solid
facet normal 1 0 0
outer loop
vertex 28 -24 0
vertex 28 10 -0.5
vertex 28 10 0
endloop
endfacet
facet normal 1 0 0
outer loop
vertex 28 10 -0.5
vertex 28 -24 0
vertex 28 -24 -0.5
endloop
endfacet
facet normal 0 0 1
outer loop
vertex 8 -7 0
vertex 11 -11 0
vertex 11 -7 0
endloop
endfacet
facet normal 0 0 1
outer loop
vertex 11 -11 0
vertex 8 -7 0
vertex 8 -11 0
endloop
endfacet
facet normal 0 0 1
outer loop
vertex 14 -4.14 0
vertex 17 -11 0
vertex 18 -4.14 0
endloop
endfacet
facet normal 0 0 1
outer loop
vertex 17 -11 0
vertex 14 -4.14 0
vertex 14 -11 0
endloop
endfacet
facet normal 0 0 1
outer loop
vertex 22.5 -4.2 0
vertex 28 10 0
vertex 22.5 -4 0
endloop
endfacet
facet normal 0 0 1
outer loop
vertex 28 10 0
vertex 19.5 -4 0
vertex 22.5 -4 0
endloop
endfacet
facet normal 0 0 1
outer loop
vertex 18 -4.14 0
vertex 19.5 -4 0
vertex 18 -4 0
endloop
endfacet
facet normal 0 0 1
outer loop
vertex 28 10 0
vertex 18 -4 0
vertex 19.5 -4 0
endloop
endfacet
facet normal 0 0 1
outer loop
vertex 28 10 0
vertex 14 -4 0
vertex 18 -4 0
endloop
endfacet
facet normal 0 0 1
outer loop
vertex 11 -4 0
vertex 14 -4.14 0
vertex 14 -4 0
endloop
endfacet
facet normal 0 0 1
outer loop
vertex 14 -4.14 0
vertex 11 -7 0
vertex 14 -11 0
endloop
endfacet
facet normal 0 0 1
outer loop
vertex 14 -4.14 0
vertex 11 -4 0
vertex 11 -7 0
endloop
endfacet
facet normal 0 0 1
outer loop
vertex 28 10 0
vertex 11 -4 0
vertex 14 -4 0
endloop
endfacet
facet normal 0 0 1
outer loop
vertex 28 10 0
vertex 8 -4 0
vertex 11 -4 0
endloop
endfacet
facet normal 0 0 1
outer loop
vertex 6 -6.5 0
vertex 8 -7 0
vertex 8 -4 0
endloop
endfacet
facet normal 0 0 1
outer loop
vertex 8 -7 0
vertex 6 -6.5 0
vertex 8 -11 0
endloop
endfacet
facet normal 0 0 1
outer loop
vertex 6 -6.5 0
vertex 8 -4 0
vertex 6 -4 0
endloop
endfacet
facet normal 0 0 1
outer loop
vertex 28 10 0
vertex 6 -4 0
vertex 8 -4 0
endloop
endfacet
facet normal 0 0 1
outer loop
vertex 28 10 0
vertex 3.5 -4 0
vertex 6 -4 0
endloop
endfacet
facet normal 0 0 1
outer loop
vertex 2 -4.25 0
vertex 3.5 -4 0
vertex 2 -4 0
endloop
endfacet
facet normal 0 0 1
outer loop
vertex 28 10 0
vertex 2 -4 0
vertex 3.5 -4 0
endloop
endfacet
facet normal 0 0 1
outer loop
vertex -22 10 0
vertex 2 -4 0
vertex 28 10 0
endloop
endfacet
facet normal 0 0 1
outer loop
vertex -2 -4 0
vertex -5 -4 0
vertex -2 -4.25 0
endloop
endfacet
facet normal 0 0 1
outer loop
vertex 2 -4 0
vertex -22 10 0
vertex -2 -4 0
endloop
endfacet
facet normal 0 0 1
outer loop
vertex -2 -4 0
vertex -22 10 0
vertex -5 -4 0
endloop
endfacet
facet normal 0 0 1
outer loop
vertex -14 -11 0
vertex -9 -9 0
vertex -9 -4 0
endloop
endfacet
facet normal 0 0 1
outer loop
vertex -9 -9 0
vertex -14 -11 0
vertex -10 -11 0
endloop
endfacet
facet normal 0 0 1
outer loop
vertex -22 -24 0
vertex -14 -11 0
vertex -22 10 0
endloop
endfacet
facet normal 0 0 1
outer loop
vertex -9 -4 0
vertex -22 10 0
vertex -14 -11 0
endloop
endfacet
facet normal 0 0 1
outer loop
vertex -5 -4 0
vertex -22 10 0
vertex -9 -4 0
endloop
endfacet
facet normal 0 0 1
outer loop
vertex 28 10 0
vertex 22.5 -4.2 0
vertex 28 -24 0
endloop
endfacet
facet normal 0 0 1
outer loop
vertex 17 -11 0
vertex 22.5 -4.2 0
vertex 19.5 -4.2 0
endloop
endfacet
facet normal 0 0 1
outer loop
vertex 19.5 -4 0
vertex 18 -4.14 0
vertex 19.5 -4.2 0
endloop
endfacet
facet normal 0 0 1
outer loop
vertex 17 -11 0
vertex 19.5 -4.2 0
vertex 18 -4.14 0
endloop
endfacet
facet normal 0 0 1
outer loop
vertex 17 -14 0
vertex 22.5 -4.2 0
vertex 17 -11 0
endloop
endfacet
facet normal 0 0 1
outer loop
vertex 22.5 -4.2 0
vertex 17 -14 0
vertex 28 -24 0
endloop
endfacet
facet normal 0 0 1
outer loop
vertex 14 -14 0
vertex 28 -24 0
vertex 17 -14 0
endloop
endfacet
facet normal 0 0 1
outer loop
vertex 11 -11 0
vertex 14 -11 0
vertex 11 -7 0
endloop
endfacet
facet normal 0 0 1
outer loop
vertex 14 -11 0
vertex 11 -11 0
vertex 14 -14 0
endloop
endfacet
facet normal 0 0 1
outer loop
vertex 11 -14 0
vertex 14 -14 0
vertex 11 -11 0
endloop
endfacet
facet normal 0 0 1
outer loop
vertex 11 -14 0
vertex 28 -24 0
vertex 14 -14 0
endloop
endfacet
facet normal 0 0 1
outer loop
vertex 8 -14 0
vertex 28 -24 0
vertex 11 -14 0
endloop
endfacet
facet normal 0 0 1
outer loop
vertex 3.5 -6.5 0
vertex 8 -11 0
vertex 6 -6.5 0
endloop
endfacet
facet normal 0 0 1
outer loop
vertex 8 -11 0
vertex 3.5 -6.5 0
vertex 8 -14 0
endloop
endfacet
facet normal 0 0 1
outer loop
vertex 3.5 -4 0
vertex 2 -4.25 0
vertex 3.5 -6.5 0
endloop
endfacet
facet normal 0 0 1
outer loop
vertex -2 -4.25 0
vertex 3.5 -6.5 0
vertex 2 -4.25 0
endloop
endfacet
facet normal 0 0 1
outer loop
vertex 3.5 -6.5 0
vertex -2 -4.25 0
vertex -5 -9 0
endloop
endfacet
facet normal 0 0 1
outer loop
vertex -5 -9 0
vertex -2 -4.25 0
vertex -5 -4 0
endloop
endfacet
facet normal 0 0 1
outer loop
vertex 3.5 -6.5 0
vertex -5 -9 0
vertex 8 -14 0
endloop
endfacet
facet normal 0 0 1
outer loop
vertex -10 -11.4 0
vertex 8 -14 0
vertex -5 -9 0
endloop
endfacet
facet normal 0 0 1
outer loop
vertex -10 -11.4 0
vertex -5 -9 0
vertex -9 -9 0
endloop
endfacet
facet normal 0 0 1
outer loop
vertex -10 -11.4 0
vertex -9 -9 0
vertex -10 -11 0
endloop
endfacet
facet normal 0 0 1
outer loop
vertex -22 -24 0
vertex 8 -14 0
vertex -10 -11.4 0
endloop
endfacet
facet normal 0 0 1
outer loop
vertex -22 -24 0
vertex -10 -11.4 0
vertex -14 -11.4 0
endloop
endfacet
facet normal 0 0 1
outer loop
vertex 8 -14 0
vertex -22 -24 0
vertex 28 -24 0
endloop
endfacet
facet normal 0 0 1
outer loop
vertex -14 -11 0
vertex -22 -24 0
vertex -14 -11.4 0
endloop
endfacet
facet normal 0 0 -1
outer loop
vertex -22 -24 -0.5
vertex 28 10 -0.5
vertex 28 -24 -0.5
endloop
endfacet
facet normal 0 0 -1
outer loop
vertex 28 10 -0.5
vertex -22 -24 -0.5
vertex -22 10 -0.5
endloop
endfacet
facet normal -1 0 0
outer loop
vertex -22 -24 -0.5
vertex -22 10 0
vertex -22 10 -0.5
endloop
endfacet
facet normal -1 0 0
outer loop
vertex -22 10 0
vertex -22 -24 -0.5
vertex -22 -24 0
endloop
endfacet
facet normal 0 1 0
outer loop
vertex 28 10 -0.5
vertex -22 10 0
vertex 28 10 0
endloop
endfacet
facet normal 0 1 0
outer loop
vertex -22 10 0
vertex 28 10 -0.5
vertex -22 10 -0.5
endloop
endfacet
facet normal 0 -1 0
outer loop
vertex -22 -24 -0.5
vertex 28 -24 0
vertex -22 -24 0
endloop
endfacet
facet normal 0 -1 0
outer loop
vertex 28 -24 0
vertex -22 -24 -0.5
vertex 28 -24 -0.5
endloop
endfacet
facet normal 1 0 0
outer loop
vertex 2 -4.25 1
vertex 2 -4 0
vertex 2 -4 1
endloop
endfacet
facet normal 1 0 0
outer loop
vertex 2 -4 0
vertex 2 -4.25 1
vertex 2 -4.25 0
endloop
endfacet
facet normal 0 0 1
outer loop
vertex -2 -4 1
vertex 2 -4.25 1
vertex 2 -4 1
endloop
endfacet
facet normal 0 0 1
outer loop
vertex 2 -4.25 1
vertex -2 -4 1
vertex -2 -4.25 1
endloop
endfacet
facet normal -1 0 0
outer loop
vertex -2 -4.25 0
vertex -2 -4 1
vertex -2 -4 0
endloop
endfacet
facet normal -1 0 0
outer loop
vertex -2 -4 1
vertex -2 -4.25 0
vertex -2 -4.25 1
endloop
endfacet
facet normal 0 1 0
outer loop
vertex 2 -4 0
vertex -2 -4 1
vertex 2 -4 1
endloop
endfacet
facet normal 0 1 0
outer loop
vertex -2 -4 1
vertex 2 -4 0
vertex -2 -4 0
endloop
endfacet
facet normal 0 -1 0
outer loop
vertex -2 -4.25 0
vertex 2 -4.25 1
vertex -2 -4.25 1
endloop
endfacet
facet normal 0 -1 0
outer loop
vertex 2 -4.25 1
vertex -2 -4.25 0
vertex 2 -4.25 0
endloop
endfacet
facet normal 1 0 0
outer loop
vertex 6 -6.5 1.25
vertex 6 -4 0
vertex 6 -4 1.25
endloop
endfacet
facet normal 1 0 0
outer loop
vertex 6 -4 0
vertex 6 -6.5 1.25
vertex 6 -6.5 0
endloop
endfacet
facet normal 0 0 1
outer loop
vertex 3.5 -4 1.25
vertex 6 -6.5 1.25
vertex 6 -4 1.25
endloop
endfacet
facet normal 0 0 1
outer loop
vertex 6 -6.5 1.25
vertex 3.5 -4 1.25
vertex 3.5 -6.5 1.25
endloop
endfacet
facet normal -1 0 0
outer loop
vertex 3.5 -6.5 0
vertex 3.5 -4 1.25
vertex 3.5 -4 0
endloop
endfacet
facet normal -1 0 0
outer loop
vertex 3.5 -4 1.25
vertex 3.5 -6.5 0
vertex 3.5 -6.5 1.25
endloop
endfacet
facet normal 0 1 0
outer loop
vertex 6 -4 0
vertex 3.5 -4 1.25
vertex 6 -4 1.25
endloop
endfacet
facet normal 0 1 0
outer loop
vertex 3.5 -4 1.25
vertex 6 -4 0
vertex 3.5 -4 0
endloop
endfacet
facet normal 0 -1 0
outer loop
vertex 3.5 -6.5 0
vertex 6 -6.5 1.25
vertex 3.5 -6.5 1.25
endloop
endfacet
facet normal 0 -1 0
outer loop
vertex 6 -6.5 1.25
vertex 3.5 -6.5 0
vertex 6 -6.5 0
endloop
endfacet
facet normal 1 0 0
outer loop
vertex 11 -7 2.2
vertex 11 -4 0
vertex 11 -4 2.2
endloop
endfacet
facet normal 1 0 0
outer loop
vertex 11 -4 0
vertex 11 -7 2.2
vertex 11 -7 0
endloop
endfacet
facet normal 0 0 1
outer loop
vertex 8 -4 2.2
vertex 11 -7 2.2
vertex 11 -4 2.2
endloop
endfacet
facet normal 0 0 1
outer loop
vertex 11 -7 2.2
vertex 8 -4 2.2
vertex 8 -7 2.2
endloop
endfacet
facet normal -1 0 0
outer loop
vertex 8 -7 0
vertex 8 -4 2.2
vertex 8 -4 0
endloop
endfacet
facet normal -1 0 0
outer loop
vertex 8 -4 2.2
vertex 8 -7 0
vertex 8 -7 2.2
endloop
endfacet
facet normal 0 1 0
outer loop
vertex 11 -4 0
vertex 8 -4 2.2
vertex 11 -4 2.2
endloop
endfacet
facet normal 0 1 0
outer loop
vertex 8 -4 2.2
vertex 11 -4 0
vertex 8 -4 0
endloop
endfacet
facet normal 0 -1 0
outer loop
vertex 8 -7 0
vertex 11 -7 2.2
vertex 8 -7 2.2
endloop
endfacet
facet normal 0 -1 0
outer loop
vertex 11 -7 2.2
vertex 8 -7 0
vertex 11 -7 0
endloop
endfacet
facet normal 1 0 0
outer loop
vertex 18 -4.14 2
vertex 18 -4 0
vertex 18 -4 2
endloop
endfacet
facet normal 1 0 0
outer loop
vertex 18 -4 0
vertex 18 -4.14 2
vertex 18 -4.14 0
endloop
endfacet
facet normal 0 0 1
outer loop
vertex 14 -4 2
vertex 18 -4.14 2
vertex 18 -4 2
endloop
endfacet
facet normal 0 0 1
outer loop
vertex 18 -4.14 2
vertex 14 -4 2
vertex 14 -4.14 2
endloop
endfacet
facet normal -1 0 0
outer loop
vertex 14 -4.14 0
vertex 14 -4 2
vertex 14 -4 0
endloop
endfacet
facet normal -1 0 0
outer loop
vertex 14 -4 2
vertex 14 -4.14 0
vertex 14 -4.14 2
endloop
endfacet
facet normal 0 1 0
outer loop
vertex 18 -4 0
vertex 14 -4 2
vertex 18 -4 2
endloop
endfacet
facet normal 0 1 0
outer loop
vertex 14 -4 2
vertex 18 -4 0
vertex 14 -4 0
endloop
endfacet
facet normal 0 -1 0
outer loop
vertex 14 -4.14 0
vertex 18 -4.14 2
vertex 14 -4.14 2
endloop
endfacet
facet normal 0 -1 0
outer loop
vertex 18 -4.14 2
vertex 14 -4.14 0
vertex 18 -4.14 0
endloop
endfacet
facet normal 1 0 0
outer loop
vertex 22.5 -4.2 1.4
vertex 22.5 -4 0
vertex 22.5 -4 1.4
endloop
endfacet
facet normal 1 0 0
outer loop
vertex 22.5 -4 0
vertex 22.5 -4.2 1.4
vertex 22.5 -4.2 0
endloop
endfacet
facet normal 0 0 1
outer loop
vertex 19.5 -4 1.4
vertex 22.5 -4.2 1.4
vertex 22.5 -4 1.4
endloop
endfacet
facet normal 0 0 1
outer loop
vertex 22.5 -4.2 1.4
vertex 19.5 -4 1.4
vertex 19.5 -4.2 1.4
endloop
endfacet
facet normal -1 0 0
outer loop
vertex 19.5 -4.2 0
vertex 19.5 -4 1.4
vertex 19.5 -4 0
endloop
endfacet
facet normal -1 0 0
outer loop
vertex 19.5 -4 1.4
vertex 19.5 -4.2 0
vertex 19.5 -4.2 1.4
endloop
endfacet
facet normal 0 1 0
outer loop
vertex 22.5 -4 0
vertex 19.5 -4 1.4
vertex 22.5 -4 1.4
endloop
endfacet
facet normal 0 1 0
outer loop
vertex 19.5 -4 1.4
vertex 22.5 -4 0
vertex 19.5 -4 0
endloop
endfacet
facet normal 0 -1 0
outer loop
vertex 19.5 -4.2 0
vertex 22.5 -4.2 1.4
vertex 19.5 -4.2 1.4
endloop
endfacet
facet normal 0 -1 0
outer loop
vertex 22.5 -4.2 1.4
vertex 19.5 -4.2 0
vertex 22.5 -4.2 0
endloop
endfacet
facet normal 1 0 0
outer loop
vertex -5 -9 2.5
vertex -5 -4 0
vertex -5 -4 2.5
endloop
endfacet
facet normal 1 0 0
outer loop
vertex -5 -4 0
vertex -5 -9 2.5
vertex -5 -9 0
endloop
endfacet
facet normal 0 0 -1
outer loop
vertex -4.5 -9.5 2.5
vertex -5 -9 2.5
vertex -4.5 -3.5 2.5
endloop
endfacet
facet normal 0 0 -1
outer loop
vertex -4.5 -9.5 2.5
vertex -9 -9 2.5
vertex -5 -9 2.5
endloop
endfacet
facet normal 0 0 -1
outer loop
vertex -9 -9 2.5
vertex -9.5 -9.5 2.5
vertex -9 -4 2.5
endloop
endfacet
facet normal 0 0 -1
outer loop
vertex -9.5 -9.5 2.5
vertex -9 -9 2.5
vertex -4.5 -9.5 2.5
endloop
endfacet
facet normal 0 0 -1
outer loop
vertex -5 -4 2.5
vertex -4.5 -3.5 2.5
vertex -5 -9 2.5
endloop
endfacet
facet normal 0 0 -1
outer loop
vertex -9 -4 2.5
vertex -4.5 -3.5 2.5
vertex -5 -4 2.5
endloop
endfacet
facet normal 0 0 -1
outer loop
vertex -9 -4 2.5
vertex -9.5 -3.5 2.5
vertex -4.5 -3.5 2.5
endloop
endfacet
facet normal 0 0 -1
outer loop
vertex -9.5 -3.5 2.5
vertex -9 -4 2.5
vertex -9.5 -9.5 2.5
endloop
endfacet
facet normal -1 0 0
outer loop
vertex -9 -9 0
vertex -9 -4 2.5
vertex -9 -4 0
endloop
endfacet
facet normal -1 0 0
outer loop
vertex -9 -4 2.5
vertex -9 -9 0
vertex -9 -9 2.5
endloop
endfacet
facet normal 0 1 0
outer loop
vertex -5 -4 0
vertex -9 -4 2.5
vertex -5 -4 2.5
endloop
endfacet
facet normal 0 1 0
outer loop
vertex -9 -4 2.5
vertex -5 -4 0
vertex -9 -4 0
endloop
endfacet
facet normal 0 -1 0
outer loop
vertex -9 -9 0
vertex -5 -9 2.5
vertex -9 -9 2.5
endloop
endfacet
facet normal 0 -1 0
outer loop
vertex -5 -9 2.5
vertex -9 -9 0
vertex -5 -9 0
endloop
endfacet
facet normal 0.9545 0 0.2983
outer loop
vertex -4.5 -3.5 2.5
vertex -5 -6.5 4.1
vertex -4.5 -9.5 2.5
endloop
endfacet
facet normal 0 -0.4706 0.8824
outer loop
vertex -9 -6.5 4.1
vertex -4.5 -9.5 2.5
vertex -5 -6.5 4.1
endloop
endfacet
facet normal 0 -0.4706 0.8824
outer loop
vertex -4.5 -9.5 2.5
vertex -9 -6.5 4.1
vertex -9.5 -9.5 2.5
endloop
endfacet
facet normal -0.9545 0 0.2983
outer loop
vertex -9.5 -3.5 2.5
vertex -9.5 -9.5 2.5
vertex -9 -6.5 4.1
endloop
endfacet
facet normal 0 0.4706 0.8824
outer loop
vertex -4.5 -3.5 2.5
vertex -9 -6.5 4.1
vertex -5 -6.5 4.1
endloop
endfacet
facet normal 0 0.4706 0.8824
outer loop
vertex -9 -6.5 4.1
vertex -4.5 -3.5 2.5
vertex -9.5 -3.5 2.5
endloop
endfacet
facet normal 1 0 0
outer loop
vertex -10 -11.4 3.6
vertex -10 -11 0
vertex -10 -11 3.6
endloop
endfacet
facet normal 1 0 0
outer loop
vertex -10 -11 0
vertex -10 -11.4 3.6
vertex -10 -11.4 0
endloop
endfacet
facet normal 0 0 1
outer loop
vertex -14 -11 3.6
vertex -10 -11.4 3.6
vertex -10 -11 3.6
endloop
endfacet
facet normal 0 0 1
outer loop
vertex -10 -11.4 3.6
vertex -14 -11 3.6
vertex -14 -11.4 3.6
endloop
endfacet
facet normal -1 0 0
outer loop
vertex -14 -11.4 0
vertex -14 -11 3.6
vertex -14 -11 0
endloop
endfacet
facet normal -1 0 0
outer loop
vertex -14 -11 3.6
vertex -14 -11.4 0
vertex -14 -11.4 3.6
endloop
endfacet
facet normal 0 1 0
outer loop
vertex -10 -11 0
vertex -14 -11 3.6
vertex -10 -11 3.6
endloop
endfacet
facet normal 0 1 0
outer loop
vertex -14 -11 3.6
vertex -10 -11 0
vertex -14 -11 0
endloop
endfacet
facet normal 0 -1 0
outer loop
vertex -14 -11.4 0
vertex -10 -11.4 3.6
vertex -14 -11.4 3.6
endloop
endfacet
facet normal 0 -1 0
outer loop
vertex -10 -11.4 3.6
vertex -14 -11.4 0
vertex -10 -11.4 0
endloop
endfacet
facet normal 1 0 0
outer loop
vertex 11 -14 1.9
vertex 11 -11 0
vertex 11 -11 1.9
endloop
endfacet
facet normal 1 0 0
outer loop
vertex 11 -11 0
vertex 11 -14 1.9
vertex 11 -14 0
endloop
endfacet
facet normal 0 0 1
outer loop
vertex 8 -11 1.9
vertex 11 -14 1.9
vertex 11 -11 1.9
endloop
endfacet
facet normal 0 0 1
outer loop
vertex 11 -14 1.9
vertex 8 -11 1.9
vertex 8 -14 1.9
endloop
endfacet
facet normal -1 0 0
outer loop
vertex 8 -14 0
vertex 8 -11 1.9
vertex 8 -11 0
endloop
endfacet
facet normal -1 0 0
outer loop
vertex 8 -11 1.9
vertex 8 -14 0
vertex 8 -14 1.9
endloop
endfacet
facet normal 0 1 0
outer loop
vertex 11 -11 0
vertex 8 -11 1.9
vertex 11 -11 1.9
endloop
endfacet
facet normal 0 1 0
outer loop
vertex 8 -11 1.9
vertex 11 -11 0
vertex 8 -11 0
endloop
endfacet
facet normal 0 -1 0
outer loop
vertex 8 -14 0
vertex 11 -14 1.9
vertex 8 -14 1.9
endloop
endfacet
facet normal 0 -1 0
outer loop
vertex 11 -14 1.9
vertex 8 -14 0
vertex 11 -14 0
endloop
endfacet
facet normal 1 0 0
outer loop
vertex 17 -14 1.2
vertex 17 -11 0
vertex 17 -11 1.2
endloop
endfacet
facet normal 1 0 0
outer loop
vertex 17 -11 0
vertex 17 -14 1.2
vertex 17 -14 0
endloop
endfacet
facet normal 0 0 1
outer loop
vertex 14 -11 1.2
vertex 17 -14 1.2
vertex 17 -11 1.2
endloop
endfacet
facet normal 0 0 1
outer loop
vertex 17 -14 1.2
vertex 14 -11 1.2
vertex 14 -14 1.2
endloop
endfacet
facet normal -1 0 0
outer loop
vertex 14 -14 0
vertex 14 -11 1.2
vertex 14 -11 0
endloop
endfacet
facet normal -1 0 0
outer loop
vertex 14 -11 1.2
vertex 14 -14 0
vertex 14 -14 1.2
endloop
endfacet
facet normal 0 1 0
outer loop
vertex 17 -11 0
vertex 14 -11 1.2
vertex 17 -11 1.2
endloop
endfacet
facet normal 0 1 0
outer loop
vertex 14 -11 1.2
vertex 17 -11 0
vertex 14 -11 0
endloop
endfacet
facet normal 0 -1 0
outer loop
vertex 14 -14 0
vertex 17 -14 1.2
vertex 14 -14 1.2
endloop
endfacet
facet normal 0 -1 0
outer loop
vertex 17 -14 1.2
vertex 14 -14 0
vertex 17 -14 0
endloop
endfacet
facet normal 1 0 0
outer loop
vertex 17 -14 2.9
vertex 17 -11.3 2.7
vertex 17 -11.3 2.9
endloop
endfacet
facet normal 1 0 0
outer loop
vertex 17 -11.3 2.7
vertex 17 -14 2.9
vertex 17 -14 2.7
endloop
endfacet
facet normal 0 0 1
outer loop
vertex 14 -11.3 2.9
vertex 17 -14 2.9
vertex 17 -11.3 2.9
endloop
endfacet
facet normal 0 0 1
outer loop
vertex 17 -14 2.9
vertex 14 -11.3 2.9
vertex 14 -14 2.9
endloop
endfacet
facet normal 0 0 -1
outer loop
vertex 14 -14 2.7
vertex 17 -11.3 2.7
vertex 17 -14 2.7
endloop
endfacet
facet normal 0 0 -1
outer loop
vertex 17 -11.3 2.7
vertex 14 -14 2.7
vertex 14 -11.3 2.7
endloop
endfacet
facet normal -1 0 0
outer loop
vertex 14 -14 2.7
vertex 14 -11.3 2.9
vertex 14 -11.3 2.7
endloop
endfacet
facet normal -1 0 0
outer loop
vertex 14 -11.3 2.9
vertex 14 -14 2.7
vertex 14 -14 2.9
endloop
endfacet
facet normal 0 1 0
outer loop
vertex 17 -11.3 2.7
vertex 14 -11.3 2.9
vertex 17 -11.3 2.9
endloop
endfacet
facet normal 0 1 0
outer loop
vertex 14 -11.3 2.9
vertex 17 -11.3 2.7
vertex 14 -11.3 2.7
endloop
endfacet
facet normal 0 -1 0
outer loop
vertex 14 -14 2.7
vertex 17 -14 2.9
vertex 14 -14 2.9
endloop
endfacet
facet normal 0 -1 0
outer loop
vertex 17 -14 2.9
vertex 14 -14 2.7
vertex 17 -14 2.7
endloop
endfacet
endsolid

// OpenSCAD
// Deterministic traversal fixture (nextdayz-3c-traversal.agentscript.json).
// The teleport cvar takes SCAD "x,y" and the engine maps it to z = -y;
// lookYaw 0 walks toward scad -y, so every lane starts at a y GREATER than
// its obstacle's near face. Lanes run along x; the near faces of the first
// row sit at y = -4, the second row at y = -11.
color([0.24, 0.30, 0.22])
    translate([-22, -24, -0.5]) cube([50, 34, 0.5]);

// --- row 1: near faces at y = -4 ------------------------------------------

// x = 0: thin 1.0 m wall with open ground behind it -> vault.
color([0.55, 0.45, 0.25])
    translate([-2, -4.25, 0]) cube([4, 0.25, 1.0]);

// x = 4.75: chest-high deep platform -> mantle.
color([0.35, 0.45, 0.55])
    translate([3.5, -6.5, 0]) cube([2.5, 2.5, 1.25]);

// x = 9.5: 2.2 m platform, above the head -> climb (jump, catch, haul up).
color([0.40, 0.42, 0.48])
    translate([8.0, -7.0, 0]) cube([3.0, 3.0, 2.2]);

// x = 16: 2.0 m concrete fence, 14 cm thick -> climb over and drop behind.
color([0.52, 0.52, 0.50])
    translate([14.0, -4.14, 0]) cube([4.0, 0.14, 2.0]);

// x = 21: 1.4 m garden wall, too high to vault -> hop, press and swing over.
color([0.58, 0.40, 0.30])
    translate([19.5, -4.2, 0]) cube([3.0, 0.2, 1.4]);

// x = -7: rural house, 2.5 m walls under a pitched roof with a 0.5 m eave
// (kit_coldwar cw_part_roof). The eave lip sits 0.5 m in front of the wall
// -> climb onto the roof from under the eave.
color([0.44, 0.34, 0.22])
    translate([-9.0, -9.0, 0]) cube([4.0, 5.0, 2.5]);
color([0.34, 0.25, 0.17])
    translate([-7.0, -6.5, 2.5])
        polyhedron(points = [[-2.5, -3.0, 0], [2.5, -3.0, 0], [2.5, 3.0, 0], [-2.5, 3.0, 0], [-2.0, 0, 1.6], [2.0, 0, 1.6]],
                   faces = [[0, 1, 2, 3], [4, 5, 1, 0], [5, 4, 3, 2], [5, 2, 1], [4, 0, 3]]);

// --- row 2: near faces at y = -11 -----------------------------------------

// x = -12: 3.6 m wall, out of reach even from a jump -> plain jump.
color([0.60, 0.38, 0.25])
    translate([-14.0, -11.4, 0]) cube([4.0, 0.4, 3.6]);

// x = 9.5: 1.9 m ledge started from too far out -> the jump catches it.
color([0.42, 0.46, 0.40])
    translate([8.0, -14.0, 0]) cube([3.0, 3.0, 1.9]);

// x = 15.5: 1.2 m platform under a 1.5 m crawl space -> mantle, end crouched.
color([0.46, 0.40, 0.46])
    translate([14.0, -14.0, 0]) cube([3.0, 3.0, 1.2]);
color([0.36, 0.32, 0.36])
    translate([14.0, -14.0, 2.7]) cube([3.0, 2.7, 0.2]);
